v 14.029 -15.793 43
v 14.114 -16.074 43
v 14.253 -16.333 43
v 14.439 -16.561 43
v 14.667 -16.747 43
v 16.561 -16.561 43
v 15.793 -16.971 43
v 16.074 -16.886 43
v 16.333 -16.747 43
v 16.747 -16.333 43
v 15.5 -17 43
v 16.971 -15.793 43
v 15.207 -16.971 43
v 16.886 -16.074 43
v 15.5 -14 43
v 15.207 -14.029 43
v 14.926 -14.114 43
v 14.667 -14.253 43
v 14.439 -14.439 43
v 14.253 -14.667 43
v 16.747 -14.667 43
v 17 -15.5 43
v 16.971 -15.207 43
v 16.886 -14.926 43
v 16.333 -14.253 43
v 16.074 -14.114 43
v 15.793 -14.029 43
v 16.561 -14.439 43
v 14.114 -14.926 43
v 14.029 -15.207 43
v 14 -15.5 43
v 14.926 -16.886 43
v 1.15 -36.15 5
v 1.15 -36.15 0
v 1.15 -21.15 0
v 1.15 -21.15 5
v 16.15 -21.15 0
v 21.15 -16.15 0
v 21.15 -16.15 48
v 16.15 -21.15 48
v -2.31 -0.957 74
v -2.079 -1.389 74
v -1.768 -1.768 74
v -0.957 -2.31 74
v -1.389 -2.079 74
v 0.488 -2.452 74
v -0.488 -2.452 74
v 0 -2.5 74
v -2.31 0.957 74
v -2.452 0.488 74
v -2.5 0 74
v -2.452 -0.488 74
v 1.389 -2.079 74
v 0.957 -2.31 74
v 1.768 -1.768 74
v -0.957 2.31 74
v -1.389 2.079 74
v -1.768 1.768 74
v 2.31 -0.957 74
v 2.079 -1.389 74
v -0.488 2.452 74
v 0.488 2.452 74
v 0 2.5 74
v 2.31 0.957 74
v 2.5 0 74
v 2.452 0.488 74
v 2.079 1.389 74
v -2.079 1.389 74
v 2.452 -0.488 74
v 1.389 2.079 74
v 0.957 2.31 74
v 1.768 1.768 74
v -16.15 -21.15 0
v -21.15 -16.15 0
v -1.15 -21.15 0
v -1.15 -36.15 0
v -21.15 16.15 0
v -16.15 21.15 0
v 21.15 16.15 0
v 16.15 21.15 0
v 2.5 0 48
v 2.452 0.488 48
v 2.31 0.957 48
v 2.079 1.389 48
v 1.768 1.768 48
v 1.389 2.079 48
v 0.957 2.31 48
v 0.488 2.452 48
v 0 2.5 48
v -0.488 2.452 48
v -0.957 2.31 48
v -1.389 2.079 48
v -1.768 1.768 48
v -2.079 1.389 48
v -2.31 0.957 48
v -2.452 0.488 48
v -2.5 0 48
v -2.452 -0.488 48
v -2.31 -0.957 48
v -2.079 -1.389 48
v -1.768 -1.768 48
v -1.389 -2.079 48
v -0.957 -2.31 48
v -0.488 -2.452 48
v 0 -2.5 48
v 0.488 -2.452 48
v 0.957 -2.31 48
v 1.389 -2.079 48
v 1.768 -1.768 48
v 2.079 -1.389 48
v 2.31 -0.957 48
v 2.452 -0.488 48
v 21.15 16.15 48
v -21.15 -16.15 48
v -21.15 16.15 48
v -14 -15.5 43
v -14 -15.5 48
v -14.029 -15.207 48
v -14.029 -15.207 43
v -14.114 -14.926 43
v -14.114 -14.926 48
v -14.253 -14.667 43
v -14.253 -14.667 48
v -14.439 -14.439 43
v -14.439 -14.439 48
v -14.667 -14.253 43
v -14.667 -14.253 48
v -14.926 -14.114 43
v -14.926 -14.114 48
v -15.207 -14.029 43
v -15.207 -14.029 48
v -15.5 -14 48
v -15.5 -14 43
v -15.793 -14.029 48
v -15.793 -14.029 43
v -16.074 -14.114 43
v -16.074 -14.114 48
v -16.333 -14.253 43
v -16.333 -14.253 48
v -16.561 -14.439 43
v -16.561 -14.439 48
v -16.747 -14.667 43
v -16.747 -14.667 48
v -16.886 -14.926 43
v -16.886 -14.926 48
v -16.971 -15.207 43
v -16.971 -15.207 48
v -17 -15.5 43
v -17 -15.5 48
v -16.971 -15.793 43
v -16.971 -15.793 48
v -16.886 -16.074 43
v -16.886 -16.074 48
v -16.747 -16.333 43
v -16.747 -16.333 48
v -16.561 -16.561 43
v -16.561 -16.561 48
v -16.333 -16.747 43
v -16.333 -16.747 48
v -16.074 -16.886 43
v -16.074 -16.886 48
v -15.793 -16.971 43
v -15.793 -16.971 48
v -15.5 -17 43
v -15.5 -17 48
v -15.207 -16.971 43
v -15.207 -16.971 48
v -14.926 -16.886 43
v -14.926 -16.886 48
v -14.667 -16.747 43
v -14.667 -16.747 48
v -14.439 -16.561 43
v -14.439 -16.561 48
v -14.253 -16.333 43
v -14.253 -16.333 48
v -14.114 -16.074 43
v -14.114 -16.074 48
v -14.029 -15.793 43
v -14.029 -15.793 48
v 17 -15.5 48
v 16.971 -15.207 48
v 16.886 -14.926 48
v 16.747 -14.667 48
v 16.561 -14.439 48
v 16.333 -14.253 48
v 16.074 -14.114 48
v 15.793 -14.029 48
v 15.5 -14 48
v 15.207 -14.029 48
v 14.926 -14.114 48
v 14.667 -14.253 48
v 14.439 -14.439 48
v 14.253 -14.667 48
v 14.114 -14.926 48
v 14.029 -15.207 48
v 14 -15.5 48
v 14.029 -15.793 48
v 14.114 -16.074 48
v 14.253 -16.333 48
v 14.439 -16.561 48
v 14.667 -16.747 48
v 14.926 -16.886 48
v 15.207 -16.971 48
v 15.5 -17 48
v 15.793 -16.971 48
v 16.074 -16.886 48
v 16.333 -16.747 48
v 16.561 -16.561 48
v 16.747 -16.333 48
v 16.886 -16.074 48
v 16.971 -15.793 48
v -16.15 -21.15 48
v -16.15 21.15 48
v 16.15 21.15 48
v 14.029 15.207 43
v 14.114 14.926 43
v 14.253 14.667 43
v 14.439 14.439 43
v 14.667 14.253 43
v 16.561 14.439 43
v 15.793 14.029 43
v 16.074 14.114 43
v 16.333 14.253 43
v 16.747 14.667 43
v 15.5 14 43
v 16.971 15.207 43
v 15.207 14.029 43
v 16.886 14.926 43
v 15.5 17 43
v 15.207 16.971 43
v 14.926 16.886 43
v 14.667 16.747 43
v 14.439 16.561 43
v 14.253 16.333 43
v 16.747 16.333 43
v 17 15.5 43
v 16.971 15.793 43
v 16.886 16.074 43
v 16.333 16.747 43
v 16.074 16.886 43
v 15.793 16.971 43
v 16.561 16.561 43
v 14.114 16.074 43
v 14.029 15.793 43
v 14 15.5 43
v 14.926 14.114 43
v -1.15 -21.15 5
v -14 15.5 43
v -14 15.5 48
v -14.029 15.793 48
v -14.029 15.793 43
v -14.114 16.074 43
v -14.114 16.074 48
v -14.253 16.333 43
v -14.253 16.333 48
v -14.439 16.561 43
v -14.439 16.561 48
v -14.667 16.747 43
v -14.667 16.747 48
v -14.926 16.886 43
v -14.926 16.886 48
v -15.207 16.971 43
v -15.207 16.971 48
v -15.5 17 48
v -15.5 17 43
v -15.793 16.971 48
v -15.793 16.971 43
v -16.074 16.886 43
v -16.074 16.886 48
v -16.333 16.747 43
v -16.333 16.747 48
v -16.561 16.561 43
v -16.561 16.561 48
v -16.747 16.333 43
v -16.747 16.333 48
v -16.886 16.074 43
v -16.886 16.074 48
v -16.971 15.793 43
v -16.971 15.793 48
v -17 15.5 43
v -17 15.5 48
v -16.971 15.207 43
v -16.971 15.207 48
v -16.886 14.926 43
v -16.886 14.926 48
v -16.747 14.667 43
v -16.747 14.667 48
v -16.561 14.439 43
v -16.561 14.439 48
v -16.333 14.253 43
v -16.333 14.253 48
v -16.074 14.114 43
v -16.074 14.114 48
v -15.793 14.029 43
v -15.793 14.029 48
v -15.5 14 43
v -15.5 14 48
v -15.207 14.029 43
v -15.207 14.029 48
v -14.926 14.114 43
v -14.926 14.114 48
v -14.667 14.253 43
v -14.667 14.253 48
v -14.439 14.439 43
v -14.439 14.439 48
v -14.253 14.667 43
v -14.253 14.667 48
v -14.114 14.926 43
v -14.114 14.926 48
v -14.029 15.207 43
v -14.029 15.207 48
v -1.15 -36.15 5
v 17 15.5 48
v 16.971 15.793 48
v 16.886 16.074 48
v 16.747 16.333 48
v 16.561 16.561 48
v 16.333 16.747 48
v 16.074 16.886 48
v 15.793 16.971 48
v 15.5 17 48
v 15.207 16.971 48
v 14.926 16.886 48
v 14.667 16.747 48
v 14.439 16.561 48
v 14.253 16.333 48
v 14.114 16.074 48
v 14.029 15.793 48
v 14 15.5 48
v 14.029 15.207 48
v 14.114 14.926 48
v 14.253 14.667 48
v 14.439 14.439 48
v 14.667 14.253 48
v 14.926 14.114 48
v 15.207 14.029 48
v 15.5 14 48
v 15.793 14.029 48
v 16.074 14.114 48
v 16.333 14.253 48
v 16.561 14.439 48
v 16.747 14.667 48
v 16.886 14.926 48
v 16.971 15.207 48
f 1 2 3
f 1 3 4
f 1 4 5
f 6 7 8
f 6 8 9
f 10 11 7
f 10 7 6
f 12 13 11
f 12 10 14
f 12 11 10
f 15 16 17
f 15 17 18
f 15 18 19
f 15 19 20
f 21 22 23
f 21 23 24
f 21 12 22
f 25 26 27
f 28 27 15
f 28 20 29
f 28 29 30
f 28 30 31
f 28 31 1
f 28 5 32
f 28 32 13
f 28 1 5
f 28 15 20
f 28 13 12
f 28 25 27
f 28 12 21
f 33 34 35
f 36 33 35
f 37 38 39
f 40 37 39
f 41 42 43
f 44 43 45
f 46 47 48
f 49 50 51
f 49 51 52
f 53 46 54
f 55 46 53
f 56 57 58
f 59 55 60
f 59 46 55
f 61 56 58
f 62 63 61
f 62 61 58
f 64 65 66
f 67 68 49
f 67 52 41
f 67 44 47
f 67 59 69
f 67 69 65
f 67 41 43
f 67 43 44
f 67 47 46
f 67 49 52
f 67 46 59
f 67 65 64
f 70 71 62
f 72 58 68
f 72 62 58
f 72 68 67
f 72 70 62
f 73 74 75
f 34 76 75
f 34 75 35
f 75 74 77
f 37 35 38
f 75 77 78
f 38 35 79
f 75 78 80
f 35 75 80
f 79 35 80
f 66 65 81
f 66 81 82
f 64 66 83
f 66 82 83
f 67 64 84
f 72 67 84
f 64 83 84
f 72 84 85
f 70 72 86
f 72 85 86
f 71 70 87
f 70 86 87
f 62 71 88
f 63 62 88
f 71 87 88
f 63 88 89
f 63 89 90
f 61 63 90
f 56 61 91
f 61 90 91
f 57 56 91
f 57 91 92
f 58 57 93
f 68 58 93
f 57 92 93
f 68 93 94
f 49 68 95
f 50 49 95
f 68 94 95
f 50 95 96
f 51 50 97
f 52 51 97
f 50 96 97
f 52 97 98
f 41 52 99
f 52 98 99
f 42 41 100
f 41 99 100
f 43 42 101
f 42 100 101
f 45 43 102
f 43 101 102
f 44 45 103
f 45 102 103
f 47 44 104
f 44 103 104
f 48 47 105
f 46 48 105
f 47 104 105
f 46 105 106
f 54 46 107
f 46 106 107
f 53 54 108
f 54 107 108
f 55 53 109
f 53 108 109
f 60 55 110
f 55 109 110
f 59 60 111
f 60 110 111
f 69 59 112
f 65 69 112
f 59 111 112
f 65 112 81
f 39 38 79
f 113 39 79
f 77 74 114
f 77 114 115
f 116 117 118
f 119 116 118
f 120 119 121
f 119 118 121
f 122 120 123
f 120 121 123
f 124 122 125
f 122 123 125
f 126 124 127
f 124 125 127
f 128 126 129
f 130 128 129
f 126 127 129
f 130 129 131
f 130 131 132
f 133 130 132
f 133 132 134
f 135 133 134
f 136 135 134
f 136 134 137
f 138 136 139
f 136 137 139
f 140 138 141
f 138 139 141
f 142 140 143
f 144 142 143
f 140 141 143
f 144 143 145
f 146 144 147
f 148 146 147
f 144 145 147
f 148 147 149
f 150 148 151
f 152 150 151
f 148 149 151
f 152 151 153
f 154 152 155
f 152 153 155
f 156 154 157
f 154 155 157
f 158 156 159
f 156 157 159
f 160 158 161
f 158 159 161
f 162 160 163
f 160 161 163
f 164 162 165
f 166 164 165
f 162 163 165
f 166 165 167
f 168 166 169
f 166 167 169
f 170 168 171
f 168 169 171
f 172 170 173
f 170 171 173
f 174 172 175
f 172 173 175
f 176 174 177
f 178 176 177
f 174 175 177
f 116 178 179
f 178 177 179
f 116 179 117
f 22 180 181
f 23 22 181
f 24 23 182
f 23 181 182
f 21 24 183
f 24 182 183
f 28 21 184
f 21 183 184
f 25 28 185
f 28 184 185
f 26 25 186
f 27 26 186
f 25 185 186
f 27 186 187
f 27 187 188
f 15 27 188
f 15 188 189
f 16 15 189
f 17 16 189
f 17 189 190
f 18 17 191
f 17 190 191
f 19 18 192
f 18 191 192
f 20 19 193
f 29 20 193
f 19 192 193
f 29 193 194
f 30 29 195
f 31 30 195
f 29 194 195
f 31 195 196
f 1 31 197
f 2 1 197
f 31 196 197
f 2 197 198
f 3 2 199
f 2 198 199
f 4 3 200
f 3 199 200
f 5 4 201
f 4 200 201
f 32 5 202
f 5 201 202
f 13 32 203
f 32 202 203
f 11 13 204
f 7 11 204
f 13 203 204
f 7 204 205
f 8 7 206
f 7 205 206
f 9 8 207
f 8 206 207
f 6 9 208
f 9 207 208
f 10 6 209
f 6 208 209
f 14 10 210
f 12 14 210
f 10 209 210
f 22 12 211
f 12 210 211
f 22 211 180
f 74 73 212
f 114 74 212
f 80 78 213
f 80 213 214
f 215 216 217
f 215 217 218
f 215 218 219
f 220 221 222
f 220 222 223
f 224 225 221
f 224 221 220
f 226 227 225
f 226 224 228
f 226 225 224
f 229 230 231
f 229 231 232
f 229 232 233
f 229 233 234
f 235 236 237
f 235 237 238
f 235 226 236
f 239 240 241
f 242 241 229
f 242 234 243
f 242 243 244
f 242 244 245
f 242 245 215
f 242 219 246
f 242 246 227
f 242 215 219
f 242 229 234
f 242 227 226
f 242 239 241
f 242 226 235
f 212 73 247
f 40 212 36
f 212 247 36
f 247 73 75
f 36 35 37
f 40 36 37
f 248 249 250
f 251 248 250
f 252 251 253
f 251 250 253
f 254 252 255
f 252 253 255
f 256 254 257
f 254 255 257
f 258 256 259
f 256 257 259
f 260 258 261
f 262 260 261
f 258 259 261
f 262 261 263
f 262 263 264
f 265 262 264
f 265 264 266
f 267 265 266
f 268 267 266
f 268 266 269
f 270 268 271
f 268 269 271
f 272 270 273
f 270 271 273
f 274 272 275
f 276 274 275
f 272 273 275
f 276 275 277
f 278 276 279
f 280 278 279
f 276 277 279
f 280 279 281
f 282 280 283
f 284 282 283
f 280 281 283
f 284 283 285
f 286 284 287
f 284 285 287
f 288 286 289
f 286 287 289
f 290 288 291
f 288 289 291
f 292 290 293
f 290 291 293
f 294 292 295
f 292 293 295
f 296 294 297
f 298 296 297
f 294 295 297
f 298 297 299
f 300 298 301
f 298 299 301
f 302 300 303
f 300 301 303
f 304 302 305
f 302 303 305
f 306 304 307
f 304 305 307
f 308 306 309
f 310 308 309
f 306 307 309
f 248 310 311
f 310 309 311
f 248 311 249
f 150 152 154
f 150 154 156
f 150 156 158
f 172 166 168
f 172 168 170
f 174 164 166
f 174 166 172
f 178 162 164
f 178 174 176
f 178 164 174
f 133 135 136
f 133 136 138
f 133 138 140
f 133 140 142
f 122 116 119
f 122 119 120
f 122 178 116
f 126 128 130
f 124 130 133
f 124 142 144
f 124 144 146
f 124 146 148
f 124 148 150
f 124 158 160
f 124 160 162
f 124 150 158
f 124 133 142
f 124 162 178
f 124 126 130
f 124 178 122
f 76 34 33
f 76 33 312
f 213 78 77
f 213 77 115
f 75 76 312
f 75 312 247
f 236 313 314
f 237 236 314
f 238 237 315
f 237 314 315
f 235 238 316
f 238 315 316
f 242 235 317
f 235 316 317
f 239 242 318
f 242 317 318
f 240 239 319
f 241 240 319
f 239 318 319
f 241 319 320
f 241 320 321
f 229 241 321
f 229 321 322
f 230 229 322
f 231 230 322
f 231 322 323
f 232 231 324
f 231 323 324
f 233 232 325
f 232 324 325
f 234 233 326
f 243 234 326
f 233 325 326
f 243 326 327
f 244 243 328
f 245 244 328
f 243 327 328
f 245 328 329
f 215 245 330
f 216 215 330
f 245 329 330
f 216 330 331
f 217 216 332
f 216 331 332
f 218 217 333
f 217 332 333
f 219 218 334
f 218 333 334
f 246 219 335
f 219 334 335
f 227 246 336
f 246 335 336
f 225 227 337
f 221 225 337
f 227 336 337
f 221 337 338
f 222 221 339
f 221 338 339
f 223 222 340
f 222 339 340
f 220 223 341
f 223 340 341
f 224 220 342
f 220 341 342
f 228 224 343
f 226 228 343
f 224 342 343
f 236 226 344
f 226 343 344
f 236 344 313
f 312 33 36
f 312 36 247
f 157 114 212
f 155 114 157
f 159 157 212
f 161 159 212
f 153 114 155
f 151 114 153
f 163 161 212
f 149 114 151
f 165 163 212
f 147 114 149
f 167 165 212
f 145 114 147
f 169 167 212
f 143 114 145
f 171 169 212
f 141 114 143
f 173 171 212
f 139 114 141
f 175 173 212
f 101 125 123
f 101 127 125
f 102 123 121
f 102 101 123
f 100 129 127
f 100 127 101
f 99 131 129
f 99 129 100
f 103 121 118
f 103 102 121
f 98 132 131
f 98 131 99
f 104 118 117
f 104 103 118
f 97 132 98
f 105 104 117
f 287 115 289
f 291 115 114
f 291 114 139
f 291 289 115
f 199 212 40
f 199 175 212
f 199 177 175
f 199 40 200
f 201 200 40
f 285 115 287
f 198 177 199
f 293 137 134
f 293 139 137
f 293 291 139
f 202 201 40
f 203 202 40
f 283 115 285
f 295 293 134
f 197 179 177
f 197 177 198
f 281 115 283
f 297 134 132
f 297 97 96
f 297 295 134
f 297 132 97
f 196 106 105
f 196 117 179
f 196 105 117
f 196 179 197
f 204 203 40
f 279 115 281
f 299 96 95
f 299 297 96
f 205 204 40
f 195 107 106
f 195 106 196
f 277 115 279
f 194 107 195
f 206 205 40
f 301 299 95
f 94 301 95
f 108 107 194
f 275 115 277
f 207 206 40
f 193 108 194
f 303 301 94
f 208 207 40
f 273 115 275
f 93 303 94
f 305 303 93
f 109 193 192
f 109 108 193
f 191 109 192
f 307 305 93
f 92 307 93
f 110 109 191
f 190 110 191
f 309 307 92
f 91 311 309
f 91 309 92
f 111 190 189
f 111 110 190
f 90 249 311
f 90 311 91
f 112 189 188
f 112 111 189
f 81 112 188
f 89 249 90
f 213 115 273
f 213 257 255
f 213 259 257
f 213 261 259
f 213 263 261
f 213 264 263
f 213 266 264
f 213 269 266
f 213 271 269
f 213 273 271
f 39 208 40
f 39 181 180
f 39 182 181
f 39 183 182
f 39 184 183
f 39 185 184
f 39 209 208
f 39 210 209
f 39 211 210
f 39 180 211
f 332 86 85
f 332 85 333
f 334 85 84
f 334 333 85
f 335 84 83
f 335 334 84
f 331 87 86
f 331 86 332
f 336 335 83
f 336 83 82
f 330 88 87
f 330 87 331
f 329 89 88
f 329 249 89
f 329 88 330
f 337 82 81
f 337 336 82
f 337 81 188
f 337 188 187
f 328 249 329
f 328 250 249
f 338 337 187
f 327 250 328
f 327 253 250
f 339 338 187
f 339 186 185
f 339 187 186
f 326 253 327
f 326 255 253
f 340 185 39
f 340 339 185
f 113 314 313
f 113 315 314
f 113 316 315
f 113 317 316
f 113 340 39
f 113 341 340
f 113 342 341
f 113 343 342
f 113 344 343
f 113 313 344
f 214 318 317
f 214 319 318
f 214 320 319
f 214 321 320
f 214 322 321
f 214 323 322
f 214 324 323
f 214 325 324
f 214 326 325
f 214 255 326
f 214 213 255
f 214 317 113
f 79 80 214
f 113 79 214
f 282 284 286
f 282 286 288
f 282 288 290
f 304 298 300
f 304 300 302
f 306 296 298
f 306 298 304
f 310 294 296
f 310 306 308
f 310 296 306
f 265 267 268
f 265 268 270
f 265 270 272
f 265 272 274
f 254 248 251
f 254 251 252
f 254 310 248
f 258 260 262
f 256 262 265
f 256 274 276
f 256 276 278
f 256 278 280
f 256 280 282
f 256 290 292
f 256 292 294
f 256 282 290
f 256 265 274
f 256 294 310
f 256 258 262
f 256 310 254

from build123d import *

# Parameters (mm, degrees)
SCHIZZO1_W                   = 42.3
SCHIZZO1_H                   = 42.3
ESTRUSIONE_ESTRUSIONE1_DEPTH = 48
SMUSSO1_SIZE                 = 5
SCHIZZO2_R                   = 2.5
ESTRUSIONE_ESTRUSIONE2_DEPTH = 26
SCHIZZO3_W                   = 2.3
SCHIZZO3_H                   = 15
ESTRUSIONE_ESTRUSIONE3_DEPTH = 5
SCHIZZO4_R                   = 1.5
TAGLIO_ESTRUSIONE1_DEPTH     = 5


with BuildPart() as part:
    # Schizzo1 → Estrusione-Estrusione1 (new body)
    with BuildSketch(Plane.XY):
        Rectangle(SCHIZZO1_W, SCHIZZO1_H)
    extrude(amount=ESTRUSIONE_ESTRUSIONE1_DEPTH)

    # Smusso1
    smusso1_edges = [part.edges().sort_by_distance(p)[0] for p in [
        (21.15, -21.15, 24),
        (-21.15, -21.15, 24),
        (-21.15, 21.15, 24),
        (21.15, 21.15, 24),
    ]]
    chamfer(smusso1_edges, length=SMUSSO1_SIZE)

    # Schizzo2 → Estrusione-Estrusione2 (add)
    with BuildSketch(Plane.XY.offset(48)):
        Circle(SCHIZZO2_R)
    extrude(amount=ESTRUSIONE_ESTRUSIONE2_DEPTH)

    # Schizzo3 → Estrusione-Estrusione3 (add)
    with BuildSketch(Plane(origin=(0, 0, 0), x_dir=(-1, 0, 0), z_dir=(0, 0, -1))):
        with Locations((0, -28.65)):
            Rectangle(SCHIZZO3_W, SCHIZZO3_H)
    extrude(amount=-ESTRUSIONE_ESTRUSIONE3_DEPTH)

    # Schizzo4 → Taglio-Estrusione1 (cut)
    with BuildSketch(Plane.XY.offset(48)):
        with Locations((-15.5, 15.5)):
            Circle(SCHIZZO4_R)
        with Locations((-15.5, -15.5)):
            Circle(SCHIZZO4_R)
        with Locations((15.5, -15.5)):
            Circle(SCHIZZO4_R)
        with Locations((15.5, 15.5)):
            Circle(SCHIZZO4_R)
    extrude(amount=-TAGLIO_ESTRUSIONE1_DEPTH, mode=Mode.SUBTRACT)


solid = part.part
